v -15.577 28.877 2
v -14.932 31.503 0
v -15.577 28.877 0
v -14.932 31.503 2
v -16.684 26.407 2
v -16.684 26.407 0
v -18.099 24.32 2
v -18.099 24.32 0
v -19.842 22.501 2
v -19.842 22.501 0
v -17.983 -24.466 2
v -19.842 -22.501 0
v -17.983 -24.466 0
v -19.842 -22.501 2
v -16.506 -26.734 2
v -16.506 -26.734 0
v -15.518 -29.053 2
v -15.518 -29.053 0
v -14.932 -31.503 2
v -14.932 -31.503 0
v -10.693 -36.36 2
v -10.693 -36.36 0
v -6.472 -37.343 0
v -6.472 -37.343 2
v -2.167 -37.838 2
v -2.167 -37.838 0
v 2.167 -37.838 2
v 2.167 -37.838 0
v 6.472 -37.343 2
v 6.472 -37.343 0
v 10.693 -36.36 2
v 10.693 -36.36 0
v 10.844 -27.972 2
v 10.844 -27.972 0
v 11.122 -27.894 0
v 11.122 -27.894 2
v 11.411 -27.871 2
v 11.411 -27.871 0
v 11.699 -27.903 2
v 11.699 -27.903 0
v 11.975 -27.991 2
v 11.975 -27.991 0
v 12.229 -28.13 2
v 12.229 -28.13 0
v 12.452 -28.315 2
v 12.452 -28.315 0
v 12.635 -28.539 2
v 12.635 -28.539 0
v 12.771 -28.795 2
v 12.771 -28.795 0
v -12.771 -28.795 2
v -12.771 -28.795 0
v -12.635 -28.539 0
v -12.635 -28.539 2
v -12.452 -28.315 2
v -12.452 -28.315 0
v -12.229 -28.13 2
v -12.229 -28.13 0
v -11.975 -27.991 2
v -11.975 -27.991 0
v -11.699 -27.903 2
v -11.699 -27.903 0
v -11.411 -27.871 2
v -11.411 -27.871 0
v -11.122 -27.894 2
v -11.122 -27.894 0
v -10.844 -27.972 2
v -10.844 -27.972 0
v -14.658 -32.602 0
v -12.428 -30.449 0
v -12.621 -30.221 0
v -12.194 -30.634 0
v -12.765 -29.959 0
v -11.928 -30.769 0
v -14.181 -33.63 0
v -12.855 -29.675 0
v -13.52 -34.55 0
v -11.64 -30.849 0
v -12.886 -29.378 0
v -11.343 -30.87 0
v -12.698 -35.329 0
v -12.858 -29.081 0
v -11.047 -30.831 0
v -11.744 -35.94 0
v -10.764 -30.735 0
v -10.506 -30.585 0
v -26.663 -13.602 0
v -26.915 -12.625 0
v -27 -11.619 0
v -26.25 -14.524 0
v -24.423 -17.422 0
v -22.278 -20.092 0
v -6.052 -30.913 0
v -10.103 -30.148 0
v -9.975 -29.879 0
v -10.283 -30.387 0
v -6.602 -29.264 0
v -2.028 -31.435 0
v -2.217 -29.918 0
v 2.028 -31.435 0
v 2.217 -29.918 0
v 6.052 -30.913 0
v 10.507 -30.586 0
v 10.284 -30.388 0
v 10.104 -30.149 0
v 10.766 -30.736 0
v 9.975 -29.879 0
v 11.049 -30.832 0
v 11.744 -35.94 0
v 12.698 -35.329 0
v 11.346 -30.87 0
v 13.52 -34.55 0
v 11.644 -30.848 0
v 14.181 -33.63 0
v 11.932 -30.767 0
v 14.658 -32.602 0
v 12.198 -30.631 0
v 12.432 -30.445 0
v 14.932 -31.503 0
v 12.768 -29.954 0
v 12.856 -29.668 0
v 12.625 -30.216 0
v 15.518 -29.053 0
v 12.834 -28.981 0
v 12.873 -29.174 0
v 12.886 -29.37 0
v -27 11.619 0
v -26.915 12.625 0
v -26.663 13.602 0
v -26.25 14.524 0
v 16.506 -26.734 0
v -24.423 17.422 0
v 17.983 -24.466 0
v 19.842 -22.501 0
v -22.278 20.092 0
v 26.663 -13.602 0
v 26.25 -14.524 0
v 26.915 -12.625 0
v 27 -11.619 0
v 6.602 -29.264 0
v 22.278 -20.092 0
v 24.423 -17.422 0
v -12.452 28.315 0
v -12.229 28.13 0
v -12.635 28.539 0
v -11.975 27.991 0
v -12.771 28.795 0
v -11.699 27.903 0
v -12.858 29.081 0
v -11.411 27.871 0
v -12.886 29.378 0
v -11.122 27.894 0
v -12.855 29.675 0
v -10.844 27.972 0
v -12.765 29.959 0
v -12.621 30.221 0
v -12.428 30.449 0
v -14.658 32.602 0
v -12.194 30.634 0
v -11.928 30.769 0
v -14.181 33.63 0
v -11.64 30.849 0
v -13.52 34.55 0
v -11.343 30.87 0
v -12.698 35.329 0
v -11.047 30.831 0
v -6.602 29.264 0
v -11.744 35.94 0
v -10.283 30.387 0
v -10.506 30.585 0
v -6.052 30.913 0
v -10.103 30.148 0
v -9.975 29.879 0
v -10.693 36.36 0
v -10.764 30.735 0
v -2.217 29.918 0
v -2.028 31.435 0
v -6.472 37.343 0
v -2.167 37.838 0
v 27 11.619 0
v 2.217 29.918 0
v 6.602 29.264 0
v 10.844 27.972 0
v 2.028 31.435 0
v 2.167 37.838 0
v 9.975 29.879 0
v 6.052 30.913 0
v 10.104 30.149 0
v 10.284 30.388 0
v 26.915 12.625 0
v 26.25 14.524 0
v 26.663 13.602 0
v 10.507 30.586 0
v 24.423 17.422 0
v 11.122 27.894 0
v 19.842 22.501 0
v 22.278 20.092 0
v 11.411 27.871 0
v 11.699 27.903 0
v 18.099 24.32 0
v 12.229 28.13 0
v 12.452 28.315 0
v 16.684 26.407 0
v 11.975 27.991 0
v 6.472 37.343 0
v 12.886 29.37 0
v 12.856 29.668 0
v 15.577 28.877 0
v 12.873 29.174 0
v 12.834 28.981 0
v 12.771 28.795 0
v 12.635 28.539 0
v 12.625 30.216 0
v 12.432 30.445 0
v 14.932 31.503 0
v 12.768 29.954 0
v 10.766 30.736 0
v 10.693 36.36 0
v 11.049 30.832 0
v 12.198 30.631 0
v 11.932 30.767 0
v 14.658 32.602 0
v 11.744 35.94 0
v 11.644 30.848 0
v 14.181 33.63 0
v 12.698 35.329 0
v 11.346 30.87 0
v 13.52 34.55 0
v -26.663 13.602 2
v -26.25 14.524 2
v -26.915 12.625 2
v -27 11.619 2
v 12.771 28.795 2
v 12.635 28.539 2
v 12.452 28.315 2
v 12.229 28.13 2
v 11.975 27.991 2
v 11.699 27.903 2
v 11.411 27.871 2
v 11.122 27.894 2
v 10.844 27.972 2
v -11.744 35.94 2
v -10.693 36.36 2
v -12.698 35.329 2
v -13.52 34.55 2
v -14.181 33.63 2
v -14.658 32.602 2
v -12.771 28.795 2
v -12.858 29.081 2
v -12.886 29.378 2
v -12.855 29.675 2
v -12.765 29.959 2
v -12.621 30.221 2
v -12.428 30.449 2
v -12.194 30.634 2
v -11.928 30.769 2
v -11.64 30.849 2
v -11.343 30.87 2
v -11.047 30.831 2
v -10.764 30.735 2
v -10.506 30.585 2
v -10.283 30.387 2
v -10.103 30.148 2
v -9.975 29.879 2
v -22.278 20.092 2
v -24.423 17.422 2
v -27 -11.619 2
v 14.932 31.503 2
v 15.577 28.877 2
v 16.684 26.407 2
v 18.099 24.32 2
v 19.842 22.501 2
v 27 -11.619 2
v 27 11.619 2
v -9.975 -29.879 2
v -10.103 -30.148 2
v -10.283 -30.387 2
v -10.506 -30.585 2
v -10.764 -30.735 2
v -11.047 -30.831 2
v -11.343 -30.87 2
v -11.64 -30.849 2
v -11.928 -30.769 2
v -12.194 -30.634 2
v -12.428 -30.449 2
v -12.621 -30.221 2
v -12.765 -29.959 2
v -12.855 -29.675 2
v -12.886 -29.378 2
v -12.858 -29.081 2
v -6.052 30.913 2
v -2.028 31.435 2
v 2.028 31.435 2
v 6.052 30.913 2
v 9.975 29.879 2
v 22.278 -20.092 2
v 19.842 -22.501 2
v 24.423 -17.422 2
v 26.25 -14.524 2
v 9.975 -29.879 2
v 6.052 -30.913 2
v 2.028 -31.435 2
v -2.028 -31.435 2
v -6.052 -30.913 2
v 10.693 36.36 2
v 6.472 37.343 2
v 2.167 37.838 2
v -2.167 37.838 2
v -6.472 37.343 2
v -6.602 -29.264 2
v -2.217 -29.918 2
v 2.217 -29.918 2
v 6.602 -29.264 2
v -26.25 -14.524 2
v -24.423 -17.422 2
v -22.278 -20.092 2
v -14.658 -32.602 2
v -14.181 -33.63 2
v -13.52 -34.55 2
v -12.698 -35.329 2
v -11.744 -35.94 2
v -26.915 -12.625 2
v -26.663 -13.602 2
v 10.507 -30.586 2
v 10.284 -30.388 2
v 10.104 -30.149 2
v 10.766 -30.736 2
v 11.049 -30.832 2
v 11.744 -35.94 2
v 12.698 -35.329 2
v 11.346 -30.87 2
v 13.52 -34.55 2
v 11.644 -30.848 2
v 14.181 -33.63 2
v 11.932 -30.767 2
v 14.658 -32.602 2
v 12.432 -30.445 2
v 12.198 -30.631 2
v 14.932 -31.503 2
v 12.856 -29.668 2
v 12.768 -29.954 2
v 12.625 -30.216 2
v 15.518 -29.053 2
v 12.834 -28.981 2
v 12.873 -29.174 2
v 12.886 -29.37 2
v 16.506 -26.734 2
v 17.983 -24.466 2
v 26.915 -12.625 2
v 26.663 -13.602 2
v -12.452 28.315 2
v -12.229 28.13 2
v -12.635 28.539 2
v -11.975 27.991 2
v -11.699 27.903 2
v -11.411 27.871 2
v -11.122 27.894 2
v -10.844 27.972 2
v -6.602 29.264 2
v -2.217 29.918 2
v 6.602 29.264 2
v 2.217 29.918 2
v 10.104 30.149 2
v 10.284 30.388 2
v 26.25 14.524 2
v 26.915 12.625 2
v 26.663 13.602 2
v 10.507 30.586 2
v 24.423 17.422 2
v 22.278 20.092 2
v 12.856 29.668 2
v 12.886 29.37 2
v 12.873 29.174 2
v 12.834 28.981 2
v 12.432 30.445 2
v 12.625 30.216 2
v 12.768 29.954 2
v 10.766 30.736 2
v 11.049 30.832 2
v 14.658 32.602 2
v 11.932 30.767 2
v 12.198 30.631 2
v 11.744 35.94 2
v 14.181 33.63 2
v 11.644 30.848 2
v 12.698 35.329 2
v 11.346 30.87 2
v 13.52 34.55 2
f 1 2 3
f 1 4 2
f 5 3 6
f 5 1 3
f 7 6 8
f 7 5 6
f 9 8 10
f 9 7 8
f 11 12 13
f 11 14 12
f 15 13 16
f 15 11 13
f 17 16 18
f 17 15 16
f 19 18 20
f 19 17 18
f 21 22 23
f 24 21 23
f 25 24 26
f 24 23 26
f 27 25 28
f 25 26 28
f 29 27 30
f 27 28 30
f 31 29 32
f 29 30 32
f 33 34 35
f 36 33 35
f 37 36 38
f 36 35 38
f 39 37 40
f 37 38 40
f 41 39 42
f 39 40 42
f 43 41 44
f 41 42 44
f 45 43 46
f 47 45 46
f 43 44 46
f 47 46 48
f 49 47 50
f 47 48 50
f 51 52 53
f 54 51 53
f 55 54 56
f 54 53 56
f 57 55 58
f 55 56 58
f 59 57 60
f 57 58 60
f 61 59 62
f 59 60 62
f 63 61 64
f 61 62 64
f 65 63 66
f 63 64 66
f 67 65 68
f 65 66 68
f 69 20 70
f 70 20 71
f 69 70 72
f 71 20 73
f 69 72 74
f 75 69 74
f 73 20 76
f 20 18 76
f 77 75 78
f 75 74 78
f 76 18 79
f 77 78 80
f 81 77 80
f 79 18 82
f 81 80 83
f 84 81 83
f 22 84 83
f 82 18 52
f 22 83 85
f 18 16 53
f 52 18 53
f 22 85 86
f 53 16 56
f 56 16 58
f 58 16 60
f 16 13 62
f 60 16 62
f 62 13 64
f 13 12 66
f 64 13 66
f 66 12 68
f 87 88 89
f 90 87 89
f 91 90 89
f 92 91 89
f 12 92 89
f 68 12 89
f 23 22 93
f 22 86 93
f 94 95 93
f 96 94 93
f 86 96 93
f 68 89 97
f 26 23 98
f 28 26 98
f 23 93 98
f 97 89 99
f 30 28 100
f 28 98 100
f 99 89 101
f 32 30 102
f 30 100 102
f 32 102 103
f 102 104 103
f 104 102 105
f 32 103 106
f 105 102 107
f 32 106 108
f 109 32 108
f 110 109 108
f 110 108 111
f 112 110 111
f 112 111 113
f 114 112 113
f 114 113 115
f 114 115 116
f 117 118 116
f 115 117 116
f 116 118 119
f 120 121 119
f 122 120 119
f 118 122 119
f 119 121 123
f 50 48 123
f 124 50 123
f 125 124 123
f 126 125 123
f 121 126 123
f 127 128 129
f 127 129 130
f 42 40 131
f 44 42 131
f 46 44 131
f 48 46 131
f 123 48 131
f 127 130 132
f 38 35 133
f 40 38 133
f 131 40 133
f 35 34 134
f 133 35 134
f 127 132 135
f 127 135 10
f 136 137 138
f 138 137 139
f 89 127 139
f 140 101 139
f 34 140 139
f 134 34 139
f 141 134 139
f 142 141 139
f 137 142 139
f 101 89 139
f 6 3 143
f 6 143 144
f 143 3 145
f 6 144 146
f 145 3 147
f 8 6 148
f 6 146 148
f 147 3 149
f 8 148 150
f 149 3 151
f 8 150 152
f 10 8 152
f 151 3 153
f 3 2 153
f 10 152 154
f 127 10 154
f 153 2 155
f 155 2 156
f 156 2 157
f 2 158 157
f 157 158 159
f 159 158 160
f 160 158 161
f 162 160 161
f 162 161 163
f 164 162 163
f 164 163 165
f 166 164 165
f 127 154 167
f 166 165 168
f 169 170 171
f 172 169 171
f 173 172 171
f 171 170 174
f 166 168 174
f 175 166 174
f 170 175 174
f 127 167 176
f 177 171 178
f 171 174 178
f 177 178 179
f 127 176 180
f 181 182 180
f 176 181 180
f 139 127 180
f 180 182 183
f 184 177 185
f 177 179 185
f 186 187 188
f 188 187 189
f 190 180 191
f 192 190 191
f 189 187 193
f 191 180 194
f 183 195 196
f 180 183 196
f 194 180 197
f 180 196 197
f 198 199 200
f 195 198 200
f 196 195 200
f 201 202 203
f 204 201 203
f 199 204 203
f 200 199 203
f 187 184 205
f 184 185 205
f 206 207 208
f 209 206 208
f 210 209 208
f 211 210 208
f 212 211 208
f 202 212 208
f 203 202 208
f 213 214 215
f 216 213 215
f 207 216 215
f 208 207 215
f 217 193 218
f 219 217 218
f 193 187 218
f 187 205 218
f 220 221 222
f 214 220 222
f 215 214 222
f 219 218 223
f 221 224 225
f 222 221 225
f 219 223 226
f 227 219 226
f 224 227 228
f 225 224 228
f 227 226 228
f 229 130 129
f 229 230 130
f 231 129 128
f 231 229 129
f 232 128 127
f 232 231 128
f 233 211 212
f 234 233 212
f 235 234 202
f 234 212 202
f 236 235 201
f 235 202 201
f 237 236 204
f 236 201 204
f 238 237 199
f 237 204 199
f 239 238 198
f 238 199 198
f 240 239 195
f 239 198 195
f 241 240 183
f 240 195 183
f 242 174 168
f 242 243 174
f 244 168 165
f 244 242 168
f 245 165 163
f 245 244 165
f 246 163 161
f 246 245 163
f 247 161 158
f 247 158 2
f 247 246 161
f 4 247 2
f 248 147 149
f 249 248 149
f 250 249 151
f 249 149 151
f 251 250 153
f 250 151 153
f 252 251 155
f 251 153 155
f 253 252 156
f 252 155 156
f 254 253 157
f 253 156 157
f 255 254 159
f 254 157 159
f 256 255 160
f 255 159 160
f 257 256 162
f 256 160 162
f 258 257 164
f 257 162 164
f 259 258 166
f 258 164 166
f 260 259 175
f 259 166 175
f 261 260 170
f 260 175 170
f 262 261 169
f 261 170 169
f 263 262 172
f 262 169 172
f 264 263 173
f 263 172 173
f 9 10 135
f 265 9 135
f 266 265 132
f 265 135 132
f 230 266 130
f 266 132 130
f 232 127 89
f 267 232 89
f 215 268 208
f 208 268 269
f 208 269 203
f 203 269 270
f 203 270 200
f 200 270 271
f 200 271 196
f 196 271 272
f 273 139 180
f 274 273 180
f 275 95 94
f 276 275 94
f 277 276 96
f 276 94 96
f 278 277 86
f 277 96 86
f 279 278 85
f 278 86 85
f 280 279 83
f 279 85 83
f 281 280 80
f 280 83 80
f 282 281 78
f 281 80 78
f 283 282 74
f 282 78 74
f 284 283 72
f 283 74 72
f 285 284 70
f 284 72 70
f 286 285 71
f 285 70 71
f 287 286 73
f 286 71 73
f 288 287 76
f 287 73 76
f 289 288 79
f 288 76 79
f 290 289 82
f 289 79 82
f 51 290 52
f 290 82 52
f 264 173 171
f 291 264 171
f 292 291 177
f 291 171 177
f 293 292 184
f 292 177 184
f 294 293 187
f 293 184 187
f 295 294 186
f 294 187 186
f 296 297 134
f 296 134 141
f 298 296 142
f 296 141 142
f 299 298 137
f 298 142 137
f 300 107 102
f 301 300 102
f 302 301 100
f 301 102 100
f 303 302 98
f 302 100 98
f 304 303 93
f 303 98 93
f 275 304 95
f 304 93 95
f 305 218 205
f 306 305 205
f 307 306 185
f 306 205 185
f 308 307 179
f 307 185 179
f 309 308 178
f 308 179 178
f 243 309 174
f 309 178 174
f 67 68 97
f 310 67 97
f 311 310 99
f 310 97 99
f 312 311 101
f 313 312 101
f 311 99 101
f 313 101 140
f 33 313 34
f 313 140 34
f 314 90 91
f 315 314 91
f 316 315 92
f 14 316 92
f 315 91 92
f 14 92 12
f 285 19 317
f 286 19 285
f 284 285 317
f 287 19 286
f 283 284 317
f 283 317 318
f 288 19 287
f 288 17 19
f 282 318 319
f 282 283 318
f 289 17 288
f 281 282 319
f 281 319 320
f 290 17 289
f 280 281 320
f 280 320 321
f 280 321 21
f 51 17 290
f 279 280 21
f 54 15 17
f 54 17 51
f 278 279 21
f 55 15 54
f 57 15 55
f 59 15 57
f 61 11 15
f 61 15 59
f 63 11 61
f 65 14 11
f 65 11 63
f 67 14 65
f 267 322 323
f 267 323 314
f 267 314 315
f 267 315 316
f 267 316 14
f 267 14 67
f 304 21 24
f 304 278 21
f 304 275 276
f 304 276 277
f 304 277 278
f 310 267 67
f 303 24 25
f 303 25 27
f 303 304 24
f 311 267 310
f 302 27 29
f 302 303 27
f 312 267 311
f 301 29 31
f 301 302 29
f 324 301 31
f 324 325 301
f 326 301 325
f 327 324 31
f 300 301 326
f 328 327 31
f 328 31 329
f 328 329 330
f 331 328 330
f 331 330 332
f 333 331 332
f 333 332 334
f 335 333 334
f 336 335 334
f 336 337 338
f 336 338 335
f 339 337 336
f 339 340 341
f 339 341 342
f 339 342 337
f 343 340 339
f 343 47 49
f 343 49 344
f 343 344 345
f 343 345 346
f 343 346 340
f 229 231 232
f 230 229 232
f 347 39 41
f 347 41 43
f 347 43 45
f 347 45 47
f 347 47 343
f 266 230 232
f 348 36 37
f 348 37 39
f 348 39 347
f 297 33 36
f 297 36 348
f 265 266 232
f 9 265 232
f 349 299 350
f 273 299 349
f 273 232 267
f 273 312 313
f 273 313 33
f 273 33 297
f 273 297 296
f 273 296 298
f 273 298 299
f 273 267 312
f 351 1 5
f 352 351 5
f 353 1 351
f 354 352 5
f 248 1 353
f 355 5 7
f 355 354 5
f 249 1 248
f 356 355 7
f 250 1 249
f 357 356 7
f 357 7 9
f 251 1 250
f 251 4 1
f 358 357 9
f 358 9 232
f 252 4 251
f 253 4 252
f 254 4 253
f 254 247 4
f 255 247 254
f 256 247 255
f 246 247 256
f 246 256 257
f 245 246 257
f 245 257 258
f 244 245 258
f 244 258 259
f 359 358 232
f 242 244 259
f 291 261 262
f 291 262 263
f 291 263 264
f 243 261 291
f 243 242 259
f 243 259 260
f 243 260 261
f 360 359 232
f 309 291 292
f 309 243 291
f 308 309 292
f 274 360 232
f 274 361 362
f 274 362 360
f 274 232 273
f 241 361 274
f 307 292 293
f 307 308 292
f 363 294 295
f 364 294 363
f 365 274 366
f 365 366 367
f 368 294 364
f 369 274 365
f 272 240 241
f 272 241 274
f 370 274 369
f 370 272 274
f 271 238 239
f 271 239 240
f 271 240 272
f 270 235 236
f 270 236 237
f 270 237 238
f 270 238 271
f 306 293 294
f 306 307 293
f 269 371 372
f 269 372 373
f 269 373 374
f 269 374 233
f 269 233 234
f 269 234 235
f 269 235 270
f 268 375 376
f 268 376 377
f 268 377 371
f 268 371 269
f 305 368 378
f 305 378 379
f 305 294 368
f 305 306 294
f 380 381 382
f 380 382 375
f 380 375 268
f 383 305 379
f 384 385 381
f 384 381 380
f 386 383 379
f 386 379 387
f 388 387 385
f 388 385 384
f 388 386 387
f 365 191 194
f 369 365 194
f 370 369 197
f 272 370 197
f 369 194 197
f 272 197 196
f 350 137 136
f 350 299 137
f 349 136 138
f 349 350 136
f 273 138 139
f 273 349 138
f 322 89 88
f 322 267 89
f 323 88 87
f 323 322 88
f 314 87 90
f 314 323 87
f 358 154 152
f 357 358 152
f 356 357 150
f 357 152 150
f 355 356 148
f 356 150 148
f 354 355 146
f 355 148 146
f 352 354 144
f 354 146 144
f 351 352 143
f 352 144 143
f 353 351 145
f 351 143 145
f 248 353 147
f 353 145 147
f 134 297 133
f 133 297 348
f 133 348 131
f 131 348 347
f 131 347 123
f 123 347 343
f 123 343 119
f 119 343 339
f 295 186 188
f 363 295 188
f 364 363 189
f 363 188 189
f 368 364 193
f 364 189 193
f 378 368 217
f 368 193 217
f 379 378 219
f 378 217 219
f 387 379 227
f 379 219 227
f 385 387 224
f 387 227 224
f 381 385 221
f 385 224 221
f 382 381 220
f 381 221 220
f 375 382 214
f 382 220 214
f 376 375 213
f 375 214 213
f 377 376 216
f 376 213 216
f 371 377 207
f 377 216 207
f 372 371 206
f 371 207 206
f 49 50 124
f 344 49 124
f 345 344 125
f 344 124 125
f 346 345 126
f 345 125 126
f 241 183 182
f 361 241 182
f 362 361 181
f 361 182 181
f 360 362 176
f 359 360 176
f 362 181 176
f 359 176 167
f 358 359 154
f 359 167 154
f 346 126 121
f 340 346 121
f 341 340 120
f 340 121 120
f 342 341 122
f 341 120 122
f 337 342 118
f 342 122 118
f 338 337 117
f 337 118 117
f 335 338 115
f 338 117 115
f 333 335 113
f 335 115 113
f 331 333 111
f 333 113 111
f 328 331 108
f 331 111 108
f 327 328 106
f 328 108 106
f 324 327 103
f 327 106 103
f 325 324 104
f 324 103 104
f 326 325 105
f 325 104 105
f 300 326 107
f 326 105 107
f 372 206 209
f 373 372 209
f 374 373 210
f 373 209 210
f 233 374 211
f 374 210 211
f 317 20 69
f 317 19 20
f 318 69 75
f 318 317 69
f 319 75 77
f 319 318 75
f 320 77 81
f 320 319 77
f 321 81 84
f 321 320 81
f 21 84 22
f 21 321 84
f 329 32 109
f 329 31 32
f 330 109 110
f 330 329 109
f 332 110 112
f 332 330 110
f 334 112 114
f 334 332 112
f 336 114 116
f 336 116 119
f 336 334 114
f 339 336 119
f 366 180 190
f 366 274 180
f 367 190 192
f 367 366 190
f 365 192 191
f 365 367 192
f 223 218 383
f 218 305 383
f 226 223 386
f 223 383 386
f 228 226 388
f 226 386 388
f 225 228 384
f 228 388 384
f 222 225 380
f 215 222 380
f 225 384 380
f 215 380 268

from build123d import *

# Parameters (mm, degrees)
F1_DEPTH = 2
F2_R     = 6
F3_R     = 15


with BuildPart() as f1:
    # F0 (on Top) → F1 (new body)
    with BuildSketch(Plane.XY):
        with BuildLine():
            Line((15, 27.6992779689), (15, 34.8053157432))
            ThreePointArc((15, 34.8053157432), (0, 37.9000000526), (-15, 34.8053157432))
            Line((-15, 34.8053157432), (-15, 27.6992779689))
            ThreePointArc((-15, 27.6992779689), (-13.8963378037, 28.2690961236), (-12.771069404, 28.7949611265))
            ThreePointArc((-12.771069404, 28.7949611265), (-11.9279702901, 30.7688726599), (-9.9746921233, 29.8790146599))
            ThreePointArc((-9.9746921233, 29.8790146599), (0, 31.5), (9.9746921233, 29.8790146599))
            ThreePointArc((9.9746921233, 29.8790146599), (11.6440081906, 30.8478948191), (12.8857898224, 29.370287539))
            ThreePointArc((12.8857898224, 29.370287539), (12.8568301638, 29.0769612466), (12.771069404, 28.7949611265))
            ThreePointArc((12.771069404, 28.7949611265), (13.8963378037, 28.2690961236), (15, 27.6992779689))
        make_face()
        with BuildLine():
            ThreePointArc((-12.771069404, 28.7949611265), (-13.8963378037, 28.2690961236), (-15, 27.6992779689))
            Line((-15, 27.6992779689), (-15, 25.9807621135))
            ThreePointArc((-15, 25.9807621135), (-12.9600924591, 27.0561638717), (-10.8436093232, 27.9717024302))
            ThreePointArc((-10.8436093232, 27.9717024302), (-11.9749780232, 27.9908466145), (-12.771069404, 28.7949611265))
        make_face()
        with BuildLine():
            Line((15, 25.9807621135), (15, 27.6992779689))
            ThreePointArc((15, 27.6992779689), (13.8963378037, 28.2690961236), (12.771069404, 28.7949611265))
            ThreePointArc((12.771069404, 28.7949611265), (11.9749780416, 27.9908466224), (10.8436093607, 27.9717024157))
            ThreePointArc((10.8436093607, 27.9717024157), (12.9600924772, 27.056163863), (15, 25.9807621135))
        make_face()
        with BuildLine():
            Line((-15, -27.6992779689), (-15, -34.8053157432))
            ThreePointArc((-15, -34.8053157432), (0, -37.9000000526), (15, -34.8053157432))
            Line((15, -34.8053157432), (15, -27.6992779689))
            ThreePointArc((15, -27.6992779689), (13.8963378037, -28.2690961236), (12.771069404, -28.7949611265))
            ThreePointArc((12.771069404, -28.7949611265), (12.8568301638, -29.0769612466), (12.8857898224, -29.370287539))
            ThreePointArc((12.8857898224, -29.370287539), (11.6440081906, -30.8478948191), (9.9746921233, -29.8790146599))
            ThreePointArc((9.9746921233, -29.8790146599), (0, -31.5), (-9.9746921233, -29.8790146599))
            ThreePointArc((-9.9746921233, -29.8790146599), (-11.9279702901, -30.7688726599), (-12.771069404, -28.7949611265))
            ThreePointArc((-12.771069404, -28.7949611265), (-13.8963378037, -28.2690961236), (-15, -27.6992779689))
        make_face()
        with BuildLine():
            Line((-15, -25.9807621135), (-15, -27.6992779689))
            ThreePointArc((-15, -27.6992779689), (-13.8963378037, -28.2690961236), (-12.771069404, -28.7949611265))
            ThreePointArc((-12.771069404, -28.7949611265), (-11.9749780659, -27.9908466327), (-10.8436094098, -27.9717023967))
            ThreePointArc((-10.8436094098, -27.9717023967), (-12.960092501, -27.0561638516), (-15, -25.9807621135))
        make_face()
        with BuildLine():
            ThreePointArc((12.771069404, -28.7949611265), (13.8963378037, -28.2690961236), (15, -27.6992779689))
            Line((15, -27.6992779689), (15, -25.9807621135))
            ThreePointArc((15, -25.9807621135), (12.9600924534, -27.0561638744), (10.8436093114, -27.9717024348))
            ThreePointArc((10.8436093114, -27.9717024348), (11.9749780173, -27.990846612), (12.771069404, -28.7949611265))
        make_face()
        with BuildLine():
            ThreePointArc((27, 13.0766968306), (21.968812558, 20.4296665365), (15, 25.9807621135))
            ThreePointArc((15, 25.9807621135), (12.9600924772, 27.056163863), (10.8436093607, 27.9717024157))
            ThreePointArc((10.8436093607, 27.9717024157), (2.01e-08, 30), (-10.8436093232, 27.9717024302))
            ThreePointArc((-10.8436093232, 27.9717024302), (-12.9600924591, 27.0561638717), (-15, 25.9807621135))
            ThreePointArc((-15, 25.9807621135), (-21.968812558, 20.4296665365), (-27, 13.0766968306))
            Line((-27, 13.0766968306), (-27, -13.0766968306))
            ThreePointArc((-27, -13.0766968306), (-21.968812558, -20.4296665365), (-15, -25.9807621135))
            ThreePointArc((-15, -25.9807621135), (-12.960092501, -27.0561638516), (-10.8436094098, -27.9717023967))
            ThreePointArc((-10.8436094098, -27.9717023967), (-5.28e-08, -30), (10.8436093114, -27.9717024348))
            ThreePointArc((10.8436093114, -27.9717024348), (12.9600924534, -27.0561638744), (15, -25.9807621135))
            ThreePointArc((15, -25.9807621135), (21.968812558, -20.4296665365), (27, -13.0766968306))
            Line((27, -13.0766968306), (27, 13.0766968306))
        make_face()
    extrude(amount=F1_DEPTH)

    # F2
    f2_edges = [f1.edges().sort_by_distance(p)[0] for p in [
        (-15, -34.805316, 1),
        (15, -34.805316, 1),
        (15, 34.805316, 1),
        (-15, 34.805316, 1),
        (27, 13.076697, 1),
        (27, -13.076697, 1),
        (-27, 13.076697, 1),
        (-27, -13.076697, 1),
    ]]
    fillet(f2_edges, radius=F2_R)

    # F3
    f3_edges = [f1.edges().sort_by_distance(p)[0] for p in [
        (-15, -25.980762, 1),
        (15, -25.980762, 1),
        (15, 25.980762, 1),
        (-15, 25.980762, 1),
    ]]
    fillet(f3_edges, radius=F3_R)


solid = f1.part
